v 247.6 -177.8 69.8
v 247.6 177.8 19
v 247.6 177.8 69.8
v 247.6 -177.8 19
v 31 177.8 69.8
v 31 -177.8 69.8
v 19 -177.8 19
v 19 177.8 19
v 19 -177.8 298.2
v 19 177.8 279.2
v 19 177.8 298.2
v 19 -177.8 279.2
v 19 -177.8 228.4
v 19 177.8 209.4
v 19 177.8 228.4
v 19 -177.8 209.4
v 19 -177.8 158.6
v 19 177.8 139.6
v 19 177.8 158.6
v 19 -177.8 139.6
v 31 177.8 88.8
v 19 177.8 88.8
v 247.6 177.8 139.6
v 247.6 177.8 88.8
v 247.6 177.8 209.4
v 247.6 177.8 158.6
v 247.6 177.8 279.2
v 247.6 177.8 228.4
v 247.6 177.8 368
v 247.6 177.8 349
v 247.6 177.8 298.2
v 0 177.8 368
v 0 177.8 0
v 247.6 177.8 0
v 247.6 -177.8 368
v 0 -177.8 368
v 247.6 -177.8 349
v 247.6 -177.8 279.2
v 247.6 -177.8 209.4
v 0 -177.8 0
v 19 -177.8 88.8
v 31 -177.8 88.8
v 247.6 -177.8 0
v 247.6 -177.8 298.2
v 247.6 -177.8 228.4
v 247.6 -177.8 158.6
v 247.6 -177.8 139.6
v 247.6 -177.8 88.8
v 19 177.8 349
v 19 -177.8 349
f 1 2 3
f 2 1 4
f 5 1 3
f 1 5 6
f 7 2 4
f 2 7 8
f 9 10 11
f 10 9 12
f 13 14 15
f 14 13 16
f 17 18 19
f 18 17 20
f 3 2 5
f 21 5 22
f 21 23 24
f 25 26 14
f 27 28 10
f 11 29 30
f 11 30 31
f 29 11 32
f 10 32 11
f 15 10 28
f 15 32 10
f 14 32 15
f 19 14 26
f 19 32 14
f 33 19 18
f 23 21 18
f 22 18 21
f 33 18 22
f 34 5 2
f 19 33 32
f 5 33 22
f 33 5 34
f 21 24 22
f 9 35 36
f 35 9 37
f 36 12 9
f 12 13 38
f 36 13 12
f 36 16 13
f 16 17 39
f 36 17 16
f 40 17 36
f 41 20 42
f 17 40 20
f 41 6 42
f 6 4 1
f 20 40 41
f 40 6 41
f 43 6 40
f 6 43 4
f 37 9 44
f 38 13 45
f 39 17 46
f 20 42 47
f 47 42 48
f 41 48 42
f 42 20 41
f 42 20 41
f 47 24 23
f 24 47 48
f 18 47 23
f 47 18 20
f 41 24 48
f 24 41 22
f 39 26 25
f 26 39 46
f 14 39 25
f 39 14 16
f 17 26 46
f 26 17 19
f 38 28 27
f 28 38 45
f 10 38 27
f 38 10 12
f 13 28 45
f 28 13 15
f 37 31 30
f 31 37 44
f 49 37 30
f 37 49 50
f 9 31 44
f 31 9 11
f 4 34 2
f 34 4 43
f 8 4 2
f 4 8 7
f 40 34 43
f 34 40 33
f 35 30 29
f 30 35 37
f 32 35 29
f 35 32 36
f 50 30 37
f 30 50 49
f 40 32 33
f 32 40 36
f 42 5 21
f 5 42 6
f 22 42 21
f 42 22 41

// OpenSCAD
t = 19; // 3/4" mdf (approx)

organizer_w = 9 * 25.4;
organizer_d = 14 * 25.4;
organizer_h = 2 * 25.4;

module organizer() {
  color("white")
  cube(size=[organizer_w, organizer_d, organizer_h], center=true);
}

z = t * 6 + organizer_h * 5;

translate([(organizer_w + t * 2) / 2, 0, 0]) {
  translate([0, 0, t/2]) 
  cube(size=[organizer_w, organizer_d, t], center=true);

  translate([0, 0, z - t/2]) 
  cube(size=[organizer_w, organizer_d, t], center=true);

  
  color("pink")
  translate([-(organizer_w) / 2 - t / 2, 0, z/2]) 
  cube(size=[t, organizer_d, z], center=true);

  translate([0, 0, organizer_h / 2 + t]) 
  for (i=[0:4]) {
    translate([0, 0, (organizer_h + t) * i]) 
    organizer();
  }
  
  
  
  color("blue")
  translate([organizer_w / - 2 + 12 / 2, 0, t + organizer_h + t/2]) 
  cube(size=[12, organizer_d, t], center=true);
}
